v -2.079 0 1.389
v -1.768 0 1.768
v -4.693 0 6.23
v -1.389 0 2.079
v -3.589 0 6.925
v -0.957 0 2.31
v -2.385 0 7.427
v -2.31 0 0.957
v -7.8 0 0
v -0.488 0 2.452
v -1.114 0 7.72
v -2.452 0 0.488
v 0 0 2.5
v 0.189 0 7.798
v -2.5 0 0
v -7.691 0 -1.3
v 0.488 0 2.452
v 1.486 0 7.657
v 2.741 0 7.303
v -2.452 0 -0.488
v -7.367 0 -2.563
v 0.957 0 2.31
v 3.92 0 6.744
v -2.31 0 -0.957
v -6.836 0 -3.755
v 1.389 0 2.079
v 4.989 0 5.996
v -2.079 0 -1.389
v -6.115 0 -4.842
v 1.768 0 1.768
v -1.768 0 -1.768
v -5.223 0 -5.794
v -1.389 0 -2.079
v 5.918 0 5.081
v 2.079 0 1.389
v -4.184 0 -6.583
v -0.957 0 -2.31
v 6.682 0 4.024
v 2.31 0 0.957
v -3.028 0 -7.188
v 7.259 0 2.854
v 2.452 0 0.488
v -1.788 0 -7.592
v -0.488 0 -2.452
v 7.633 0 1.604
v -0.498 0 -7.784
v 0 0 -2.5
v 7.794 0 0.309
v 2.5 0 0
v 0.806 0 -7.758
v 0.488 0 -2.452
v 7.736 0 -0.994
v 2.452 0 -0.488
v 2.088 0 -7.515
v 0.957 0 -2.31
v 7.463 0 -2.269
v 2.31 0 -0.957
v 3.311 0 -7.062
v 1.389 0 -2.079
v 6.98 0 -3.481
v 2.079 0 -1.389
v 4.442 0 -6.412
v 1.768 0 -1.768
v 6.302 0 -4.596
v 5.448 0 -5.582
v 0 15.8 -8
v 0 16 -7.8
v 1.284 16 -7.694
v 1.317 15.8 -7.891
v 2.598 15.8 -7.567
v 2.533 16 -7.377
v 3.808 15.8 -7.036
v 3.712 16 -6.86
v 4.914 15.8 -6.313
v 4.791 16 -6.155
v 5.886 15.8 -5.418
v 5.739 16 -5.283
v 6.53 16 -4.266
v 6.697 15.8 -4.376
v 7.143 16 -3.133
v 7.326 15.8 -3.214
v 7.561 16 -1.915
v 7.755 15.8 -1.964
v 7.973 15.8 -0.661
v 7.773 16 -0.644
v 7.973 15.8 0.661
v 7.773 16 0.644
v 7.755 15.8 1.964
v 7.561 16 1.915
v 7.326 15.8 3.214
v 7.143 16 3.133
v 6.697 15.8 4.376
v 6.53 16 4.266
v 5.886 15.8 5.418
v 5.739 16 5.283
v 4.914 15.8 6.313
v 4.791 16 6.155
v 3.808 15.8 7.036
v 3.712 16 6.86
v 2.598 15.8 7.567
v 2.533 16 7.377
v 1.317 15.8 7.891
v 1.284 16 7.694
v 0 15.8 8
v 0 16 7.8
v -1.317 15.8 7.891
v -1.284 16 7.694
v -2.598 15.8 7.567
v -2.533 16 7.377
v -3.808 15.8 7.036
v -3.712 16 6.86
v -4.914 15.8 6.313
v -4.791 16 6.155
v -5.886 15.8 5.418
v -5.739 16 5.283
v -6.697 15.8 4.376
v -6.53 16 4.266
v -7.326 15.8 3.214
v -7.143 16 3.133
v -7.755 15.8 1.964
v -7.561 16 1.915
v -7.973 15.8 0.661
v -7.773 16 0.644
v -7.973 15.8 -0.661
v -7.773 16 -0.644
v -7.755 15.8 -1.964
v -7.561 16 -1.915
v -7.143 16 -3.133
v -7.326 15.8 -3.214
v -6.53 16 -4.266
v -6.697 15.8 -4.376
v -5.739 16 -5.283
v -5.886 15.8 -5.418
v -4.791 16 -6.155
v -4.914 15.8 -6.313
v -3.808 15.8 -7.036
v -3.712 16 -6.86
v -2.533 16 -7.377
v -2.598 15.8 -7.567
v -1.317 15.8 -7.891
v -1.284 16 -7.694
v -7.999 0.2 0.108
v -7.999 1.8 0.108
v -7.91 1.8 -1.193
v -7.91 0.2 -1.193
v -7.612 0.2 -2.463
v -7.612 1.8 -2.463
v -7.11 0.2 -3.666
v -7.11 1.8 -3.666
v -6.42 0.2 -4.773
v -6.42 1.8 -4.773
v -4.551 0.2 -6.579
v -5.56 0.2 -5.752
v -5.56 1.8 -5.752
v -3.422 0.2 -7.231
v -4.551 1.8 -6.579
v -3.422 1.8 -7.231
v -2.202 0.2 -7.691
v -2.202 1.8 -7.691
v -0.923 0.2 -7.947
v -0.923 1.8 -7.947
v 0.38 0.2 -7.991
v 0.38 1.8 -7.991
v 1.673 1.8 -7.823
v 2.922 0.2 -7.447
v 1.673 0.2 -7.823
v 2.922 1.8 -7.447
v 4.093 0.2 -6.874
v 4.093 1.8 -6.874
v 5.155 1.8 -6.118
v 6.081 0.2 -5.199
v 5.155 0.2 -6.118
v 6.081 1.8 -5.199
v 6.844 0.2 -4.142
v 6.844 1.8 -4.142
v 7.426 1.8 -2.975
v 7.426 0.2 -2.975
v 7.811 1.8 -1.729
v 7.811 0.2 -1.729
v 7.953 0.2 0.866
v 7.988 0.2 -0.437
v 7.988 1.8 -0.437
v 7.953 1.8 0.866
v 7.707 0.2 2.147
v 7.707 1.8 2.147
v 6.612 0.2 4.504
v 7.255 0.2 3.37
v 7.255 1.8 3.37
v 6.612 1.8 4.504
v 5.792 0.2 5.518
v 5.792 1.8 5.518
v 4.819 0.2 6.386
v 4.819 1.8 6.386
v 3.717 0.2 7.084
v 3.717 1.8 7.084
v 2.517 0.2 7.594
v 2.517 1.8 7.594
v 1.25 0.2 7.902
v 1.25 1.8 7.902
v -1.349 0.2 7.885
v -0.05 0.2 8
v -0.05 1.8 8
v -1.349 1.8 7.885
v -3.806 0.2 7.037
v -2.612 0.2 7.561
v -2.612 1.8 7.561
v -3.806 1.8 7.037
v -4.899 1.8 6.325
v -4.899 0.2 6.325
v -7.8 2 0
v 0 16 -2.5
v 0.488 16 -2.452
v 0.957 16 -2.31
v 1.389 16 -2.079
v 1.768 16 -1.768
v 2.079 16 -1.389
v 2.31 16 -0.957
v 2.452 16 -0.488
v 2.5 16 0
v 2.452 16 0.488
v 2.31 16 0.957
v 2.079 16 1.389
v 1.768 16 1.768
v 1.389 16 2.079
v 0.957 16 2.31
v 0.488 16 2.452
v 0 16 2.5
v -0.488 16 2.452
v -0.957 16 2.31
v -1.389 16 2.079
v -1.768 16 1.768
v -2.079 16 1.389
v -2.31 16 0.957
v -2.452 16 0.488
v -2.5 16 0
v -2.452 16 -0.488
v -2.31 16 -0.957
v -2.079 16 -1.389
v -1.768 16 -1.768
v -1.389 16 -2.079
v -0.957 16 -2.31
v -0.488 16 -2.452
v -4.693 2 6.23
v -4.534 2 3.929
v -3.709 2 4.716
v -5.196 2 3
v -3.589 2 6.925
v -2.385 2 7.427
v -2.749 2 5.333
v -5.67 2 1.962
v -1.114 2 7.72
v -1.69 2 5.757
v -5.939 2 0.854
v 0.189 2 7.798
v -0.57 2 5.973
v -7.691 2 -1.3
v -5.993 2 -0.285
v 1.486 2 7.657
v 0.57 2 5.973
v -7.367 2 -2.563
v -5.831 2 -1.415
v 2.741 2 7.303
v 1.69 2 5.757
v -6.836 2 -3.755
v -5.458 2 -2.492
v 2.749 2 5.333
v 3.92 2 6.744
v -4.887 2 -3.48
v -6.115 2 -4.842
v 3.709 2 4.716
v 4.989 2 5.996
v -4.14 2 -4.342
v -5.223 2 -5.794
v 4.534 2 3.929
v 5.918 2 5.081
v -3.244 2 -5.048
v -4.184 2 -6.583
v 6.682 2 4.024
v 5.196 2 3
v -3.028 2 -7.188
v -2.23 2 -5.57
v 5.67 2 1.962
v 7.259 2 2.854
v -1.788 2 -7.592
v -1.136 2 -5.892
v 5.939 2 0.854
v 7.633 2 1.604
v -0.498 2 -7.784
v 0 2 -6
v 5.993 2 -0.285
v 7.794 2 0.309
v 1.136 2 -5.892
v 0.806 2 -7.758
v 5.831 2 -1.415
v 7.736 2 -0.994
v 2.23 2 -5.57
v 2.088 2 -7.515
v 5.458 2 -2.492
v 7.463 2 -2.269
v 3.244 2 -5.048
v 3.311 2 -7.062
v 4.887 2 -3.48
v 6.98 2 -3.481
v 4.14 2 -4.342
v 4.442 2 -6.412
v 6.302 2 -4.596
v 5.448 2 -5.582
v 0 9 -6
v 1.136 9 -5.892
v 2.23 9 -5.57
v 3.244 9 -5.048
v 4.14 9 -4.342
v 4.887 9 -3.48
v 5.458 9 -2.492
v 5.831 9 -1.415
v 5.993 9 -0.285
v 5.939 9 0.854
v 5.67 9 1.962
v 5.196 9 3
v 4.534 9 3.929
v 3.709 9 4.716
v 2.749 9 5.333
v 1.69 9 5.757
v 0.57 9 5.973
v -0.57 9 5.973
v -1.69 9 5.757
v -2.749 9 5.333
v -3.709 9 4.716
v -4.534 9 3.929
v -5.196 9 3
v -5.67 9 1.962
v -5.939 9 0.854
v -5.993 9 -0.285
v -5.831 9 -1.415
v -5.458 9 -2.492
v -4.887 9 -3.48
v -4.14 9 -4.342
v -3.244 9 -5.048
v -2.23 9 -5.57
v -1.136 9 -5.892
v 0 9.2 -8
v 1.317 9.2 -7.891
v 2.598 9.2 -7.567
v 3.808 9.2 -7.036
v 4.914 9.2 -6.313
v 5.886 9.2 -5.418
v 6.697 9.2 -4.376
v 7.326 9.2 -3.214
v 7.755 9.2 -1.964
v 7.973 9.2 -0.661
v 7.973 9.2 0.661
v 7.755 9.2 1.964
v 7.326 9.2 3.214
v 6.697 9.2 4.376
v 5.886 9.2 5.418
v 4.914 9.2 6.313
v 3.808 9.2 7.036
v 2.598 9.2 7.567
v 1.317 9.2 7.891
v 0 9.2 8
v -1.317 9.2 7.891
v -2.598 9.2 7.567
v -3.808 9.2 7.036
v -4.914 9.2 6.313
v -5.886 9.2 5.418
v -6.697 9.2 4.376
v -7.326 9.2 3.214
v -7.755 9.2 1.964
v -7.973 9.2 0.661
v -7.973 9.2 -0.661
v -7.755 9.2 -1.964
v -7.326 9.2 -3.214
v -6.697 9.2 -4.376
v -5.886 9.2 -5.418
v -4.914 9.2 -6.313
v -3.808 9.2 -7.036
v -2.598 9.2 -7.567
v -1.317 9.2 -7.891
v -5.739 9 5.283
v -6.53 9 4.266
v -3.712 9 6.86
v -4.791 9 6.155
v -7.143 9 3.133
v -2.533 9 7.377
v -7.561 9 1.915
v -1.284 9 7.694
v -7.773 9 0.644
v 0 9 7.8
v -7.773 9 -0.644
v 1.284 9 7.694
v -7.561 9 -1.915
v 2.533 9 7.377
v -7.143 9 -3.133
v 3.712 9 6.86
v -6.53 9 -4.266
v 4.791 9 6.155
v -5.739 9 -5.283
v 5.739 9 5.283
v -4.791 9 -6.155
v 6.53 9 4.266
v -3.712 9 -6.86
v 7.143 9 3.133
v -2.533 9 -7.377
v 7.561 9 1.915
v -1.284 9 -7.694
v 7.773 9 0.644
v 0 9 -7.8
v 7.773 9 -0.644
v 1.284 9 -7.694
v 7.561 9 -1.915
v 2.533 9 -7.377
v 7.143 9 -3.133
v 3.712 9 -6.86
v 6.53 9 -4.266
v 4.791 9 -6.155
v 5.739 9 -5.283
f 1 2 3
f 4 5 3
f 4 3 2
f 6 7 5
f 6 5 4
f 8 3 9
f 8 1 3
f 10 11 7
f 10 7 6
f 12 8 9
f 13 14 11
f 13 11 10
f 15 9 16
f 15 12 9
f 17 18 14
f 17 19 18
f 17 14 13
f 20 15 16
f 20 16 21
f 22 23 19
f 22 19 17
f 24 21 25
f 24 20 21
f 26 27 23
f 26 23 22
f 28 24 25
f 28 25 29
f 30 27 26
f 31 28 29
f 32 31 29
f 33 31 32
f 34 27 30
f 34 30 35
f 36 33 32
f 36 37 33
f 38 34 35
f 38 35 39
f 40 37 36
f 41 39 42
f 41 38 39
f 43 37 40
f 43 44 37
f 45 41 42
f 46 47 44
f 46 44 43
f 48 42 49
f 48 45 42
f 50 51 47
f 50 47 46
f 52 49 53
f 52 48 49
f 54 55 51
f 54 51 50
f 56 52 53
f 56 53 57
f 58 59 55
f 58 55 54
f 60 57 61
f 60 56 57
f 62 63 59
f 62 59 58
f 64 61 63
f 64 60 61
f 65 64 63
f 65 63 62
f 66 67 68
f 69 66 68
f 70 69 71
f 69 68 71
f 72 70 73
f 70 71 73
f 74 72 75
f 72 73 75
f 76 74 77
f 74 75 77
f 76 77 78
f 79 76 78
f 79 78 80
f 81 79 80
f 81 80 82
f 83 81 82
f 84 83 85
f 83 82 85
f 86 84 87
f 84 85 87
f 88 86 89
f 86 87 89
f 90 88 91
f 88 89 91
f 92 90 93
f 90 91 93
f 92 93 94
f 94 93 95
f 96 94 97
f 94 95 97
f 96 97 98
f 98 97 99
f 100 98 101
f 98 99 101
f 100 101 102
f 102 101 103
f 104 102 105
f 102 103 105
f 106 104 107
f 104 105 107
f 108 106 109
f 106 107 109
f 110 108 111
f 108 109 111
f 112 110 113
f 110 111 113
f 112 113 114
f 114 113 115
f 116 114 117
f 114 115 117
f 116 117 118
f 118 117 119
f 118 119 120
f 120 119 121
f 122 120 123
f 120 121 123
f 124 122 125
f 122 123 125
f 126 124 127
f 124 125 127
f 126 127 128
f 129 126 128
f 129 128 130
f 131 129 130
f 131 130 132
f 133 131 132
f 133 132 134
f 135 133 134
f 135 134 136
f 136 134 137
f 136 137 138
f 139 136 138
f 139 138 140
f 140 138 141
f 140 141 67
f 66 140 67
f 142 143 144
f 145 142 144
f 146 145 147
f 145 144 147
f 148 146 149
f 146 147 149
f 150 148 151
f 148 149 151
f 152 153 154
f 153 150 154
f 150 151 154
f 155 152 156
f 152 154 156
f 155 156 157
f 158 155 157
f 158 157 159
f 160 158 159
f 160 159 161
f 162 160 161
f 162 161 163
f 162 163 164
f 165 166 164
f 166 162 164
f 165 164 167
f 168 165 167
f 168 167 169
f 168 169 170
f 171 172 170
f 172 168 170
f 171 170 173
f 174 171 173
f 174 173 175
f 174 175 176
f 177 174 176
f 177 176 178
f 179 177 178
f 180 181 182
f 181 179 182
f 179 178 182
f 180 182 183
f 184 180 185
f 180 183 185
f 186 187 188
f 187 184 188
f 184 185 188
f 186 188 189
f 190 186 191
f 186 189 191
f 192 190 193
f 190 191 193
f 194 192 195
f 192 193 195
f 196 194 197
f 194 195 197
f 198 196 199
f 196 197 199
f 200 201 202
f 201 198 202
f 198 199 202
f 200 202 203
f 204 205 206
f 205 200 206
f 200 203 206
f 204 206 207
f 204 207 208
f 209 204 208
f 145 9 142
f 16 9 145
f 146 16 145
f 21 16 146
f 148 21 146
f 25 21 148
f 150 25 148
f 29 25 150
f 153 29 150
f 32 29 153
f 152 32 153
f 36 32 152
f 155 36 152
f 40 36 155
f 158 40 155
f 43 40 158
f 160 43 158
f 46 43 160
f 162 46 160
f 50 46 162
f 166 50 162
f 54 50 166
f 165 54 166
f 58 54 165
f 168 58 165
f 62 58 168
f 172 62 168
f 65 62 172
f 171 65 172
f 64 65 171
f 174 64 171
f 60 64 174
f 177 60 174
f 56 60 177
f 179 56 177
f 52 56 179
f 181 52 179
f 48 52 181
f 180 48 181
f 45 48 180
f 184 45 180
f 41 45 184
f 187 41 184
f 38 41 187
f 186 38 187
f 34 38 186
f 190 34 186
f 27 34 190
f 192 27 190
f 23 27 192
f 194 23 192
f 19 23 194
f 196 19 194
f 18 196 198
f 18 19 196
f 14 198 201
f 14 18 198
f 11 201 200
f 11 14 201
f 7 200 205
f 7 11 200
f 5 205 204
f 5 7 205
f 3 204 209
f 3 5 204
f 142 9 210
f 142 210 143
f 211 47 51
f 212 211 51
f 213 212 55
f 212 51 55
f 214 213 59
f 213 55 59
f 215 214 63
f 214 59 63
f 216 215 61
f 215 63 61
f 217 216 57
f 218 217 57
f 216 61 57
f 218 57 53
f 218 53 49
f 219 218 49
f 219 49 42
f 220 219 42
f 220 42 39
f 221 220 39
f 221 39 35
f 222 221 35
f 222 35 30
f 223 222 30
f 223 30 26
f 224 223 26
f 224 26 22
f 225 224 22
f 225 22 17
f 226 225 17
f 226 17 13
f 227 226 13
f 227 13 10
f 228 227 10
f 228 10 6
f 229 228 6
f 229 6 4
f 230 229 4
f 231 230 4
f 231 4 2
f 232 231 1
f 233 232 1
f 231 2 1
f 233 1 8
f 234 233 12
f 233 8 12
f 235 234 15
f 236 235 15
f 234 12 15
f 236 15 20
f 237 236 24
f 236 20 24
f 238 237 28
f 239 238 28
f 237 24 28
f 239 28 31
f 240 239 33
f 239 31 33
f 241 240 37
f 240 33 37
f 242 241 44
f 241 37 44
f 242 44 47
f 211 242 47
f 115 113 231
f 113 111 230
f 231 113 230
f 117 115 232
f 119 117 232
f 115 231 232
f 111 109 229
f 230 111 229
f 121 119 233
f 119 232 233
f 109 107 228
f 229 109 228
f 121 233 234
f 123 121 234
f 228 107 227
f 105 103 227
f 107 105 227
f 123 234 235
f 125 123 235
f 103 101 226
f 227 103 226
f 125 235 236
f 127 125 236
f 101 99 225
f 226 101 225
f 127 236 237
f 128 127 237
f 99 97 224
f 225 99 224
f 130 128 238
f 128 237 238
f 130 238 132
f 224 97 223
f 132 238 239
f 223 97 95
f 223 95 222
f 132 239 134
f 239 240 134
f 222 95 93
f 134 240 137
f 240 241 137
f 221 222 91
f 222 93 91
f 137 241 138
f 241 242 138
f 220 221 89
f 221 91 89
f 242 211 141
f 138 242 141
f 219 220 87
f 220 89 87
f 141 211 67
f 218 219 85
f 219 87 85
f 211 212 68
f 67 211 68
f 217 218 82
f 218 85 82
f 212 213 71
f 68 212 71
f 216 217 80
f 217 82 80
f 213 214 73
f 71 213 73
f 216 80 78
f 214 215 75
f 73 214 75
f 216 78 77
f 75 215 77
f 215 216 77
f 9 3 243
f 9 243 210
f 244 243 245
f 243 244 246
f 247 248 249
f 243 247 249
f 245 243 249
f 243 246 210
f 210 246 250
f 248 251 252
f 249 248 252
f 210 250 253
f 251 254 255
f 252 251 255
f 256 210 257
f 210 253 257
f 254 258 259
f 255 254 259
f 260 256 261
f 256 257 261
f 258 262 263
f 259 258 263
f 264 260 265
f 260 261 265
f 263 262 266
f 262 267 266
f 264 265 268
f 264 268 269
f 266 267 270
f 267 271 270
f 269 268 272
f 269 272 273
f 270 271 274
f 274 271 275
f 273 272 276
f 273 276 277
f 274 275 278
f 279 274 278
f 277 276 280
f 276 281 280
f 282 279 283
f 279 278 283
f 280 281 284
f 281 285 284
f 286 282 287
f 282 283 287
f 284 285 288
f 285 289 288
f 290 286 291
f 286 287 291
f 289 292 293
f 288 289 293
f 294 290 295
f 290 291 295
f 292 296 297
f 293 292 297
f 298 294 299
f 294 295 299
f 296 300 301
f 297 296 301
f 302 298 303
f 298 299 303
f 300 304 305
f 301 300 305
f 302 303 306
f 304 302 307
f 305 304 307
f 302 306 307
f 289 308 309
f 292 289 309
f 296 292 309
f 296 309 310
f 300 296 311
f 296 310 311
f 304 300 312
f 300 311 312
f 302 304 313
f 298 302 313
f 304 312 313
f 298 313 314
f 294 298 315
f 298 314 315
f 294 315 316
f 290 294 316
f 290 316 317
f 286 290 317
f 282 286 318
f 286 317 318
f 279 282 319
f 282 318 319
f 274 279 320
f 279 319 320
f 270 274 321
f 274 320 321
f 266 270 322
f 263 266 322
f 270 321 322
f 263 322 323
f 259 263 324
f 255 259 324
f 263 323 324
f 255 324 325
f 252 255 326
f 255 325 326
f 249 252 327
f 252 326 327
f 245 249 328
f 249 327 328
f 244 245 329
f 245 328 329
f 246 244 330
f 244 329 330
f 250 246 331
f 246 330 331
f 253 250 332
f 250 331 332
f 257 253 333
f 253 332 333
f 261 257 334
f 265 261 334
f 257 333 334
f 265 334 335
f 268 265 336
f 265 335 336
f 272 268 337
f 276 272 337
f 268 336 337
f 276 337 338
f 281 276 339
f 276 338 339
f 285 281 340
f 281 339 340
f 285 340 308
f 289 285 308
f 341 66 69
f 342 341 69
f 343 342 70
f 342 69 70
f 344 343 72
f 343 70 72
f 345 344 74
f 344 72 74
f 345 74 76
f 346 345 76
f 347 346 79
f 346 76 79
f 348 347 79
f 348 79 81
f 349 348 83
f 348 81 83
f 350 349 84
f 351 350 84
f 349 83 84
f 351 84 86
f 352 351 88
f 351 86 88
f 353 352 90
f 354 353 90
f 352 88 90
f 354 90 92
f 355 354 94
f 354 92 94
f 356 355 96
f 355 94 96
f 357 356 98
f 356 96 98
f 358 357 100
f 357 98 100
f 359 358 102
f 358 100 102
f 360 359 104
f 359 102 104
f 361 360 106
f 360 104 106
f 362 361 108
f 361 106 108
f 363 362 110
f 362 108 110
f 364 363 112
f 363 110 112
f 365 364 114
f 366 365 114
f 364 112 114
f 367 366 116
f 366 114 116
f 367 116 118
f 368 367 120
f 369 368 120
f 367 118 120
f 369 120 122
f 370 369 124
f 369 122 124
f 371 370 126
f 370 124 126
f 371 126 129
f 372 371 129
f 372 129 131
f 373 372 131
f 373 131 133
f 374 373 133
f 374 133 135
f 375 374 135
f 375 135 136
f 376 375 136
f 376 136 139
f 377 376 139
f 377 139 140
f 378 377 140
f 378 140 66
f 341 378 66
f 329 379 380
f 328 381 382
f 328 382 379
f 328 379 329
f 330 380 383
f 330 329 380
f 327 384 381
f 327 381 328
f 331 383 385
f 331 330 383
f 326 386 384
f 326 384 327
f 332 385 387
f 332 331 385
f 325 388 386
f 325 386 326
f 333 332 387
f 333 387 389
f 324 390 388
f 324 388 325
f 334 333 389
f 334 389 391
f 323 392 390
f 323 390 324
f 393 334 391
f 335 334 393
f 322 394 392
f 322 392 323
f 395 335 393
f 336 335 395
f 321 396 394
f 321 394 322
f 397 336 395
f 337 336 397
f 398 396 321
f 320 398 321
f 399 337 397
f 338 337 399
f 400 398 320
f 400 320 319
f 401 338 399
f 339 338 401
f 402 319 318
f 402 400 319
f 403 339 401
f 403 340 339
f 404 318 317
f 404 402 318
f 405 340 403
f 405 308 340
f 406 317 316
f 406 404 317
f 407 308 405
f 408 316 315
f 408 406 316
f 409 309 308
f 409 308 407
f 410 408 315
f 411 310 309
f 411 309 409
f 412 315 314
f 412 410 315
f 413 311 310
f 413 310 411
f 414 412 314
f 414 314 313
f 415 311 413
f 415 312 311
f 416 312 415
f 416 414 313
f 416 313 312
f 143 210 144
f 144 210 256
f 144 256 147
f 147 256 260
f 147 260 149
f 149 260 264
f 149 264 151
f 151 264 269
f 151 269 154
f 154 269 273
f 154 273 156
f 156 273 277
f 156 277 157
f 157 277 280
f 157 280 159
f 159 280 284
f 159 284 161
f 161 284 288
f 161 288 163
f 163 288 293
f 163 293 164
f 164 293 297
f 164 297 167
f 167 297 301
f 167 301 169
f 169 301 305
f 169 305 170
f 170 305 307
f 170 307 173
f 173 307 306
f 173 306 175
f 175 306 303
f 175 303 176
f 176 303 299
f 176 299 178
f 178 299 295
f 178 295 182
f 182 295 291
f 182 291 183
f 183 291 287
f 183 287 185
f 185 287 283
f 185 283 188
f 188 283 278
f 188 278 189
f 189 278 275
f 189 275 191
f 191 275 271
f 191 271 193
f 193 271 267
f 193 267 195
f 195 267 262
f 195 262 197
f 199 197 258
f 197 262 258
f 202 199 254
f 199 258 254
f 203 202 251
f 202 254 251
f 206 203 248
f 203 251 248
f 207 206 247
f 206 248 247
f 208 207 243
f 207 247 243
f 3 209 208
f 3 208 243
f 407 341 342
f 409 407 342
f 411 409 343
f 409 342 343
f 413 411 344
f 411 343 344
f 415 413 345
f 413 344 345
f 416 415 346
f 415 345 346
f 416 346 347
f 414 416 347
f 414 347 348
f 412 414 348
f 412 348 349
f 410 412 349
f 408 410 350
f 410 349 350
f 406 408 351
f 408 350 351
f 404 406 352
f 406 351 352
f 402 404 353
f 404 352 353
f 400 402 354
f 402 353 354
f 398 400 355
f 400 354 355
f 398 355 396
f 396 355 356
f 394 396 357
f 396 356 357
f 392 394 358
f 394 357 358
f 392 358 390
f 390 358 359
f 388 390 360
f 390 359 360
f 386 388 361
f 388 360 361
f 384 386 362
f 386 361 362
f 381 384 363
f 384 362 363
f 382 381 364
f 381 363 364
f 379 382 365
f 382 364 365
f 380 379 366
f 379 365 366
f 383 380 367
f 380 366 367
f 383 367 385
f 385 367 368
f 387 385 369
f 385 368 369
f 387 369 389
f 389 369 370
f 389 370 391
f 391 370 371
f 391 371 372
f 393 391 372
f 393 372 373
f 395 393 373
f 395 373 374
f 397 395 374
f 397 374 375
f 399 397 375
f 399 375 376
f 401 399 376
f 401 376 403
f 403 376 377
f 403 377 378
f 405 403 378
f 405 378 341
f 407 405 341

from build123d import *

# Parameters (mm, degrees)
SKETCH1_R             = 8
BOSS_EXTRUDE1_DEPTH   = 7
SKETCH2_R             = 6
BOSS_EXTRUDE2_DEPTH   = 7
SKETCH3_R             = 8
BOSS_EXTRUDE3_DEPTH   = 2
CHAMFER1_SIZE         = 0.2
SKETCH4_R             = 2.5
CUT_EXTRUDE1_DEPTH    = 20
BODY_MOVE_COPY1_ANGLE = 180
CUT_EXTRUDE2_DEPTH    = 3


with BuildPart() as part:
    # Sketch1 → Boss-Extrude1 (new body)
    with BuildSketch(Plane(origin=(0, 0, 0), x_dir=(1, 0, 0), z_dir=(0, 1, 0))):
        with Locations(Location((0, 0, 0), (0, 0, 270))):
            Circle(SKETCH1_R)
    extrude(amount=BOSS_EXTRUDE1_DEPTH)

    # Sketch2 → Boss-Extrude2 (add)
    with BuildSketch(Plane(origin=(0, 7, 0), x_dir=(1, 0, 0), z_dir=(0, 1, 0))):
        with Locations(Location((0, 0, 0), (0, 0, 270))):
            Circle(SKETCH2_R)
    extrude(amount=BOSS_EXTRUDE2_DEPTH)

    # Sketch3 → Boss-Extrude3 (add)
    with BuildSketch(Plane(origin=(0, 14, 0), x_dir=(1, 0, 0), z_dir=(0, 1, 0))):
        with Locations(Location((0, 0, 0), (0, 0, 270))):
            Circle(SKETCH3_R)
    extrude(amount=BOSS_EXTRUDE3_DEPTH)

    # Chamfer1
    chamfer1_edges = [part.edges().sort_by_distance(p)[0] for p in [
        (0, 0, -8),
        (0, 7, -8),
        (0, 14, -8),
        (0, 16, -8),
    ]]
    chamfer(chamfer1_edges, length=CHAMFER1_SIZE)

    # Sketch4 → Cut-Extrude1 (cut)
    with BuildSketch(Plane(origin=(0, 16, 0), x_dir=(1, 0, 0), z_dir=(0, 1, 0))):
        with Locations(Location((0, 0, 0), (0, 0, 270))):
            Circle(SKETCH4_R)
    extrude(amount=-CUT_EXTRUDE1_DEPTH, mode=Mode.SUBTRACT)


with BuildPart() as part_1:
    # Body-Move/Copy1: moved
    add(part.part.moved(Location((0, 0, 0))).rotate(Axis((0, 8, 0), (1, 0, 0)), BODY_MOVE_COPY1_ANGLE))

    # Sketch5 → Cut-Extrude2 (cut)
    with BuildSketch(Plane.XZ):
        with BuildLine():
            Line((-4.692804326, 6.230376197), (-7.8, 0))
            ThreePointArc((-7.8, 0), (-9.361590262, 4.668785935), (-4.692804326, 6.230376197))
        make_face()
    extrude(amount=-CUT_EXTRUDE2_DEPTH, mode=Mode.SUBTRACT)


solid = part_1.part
